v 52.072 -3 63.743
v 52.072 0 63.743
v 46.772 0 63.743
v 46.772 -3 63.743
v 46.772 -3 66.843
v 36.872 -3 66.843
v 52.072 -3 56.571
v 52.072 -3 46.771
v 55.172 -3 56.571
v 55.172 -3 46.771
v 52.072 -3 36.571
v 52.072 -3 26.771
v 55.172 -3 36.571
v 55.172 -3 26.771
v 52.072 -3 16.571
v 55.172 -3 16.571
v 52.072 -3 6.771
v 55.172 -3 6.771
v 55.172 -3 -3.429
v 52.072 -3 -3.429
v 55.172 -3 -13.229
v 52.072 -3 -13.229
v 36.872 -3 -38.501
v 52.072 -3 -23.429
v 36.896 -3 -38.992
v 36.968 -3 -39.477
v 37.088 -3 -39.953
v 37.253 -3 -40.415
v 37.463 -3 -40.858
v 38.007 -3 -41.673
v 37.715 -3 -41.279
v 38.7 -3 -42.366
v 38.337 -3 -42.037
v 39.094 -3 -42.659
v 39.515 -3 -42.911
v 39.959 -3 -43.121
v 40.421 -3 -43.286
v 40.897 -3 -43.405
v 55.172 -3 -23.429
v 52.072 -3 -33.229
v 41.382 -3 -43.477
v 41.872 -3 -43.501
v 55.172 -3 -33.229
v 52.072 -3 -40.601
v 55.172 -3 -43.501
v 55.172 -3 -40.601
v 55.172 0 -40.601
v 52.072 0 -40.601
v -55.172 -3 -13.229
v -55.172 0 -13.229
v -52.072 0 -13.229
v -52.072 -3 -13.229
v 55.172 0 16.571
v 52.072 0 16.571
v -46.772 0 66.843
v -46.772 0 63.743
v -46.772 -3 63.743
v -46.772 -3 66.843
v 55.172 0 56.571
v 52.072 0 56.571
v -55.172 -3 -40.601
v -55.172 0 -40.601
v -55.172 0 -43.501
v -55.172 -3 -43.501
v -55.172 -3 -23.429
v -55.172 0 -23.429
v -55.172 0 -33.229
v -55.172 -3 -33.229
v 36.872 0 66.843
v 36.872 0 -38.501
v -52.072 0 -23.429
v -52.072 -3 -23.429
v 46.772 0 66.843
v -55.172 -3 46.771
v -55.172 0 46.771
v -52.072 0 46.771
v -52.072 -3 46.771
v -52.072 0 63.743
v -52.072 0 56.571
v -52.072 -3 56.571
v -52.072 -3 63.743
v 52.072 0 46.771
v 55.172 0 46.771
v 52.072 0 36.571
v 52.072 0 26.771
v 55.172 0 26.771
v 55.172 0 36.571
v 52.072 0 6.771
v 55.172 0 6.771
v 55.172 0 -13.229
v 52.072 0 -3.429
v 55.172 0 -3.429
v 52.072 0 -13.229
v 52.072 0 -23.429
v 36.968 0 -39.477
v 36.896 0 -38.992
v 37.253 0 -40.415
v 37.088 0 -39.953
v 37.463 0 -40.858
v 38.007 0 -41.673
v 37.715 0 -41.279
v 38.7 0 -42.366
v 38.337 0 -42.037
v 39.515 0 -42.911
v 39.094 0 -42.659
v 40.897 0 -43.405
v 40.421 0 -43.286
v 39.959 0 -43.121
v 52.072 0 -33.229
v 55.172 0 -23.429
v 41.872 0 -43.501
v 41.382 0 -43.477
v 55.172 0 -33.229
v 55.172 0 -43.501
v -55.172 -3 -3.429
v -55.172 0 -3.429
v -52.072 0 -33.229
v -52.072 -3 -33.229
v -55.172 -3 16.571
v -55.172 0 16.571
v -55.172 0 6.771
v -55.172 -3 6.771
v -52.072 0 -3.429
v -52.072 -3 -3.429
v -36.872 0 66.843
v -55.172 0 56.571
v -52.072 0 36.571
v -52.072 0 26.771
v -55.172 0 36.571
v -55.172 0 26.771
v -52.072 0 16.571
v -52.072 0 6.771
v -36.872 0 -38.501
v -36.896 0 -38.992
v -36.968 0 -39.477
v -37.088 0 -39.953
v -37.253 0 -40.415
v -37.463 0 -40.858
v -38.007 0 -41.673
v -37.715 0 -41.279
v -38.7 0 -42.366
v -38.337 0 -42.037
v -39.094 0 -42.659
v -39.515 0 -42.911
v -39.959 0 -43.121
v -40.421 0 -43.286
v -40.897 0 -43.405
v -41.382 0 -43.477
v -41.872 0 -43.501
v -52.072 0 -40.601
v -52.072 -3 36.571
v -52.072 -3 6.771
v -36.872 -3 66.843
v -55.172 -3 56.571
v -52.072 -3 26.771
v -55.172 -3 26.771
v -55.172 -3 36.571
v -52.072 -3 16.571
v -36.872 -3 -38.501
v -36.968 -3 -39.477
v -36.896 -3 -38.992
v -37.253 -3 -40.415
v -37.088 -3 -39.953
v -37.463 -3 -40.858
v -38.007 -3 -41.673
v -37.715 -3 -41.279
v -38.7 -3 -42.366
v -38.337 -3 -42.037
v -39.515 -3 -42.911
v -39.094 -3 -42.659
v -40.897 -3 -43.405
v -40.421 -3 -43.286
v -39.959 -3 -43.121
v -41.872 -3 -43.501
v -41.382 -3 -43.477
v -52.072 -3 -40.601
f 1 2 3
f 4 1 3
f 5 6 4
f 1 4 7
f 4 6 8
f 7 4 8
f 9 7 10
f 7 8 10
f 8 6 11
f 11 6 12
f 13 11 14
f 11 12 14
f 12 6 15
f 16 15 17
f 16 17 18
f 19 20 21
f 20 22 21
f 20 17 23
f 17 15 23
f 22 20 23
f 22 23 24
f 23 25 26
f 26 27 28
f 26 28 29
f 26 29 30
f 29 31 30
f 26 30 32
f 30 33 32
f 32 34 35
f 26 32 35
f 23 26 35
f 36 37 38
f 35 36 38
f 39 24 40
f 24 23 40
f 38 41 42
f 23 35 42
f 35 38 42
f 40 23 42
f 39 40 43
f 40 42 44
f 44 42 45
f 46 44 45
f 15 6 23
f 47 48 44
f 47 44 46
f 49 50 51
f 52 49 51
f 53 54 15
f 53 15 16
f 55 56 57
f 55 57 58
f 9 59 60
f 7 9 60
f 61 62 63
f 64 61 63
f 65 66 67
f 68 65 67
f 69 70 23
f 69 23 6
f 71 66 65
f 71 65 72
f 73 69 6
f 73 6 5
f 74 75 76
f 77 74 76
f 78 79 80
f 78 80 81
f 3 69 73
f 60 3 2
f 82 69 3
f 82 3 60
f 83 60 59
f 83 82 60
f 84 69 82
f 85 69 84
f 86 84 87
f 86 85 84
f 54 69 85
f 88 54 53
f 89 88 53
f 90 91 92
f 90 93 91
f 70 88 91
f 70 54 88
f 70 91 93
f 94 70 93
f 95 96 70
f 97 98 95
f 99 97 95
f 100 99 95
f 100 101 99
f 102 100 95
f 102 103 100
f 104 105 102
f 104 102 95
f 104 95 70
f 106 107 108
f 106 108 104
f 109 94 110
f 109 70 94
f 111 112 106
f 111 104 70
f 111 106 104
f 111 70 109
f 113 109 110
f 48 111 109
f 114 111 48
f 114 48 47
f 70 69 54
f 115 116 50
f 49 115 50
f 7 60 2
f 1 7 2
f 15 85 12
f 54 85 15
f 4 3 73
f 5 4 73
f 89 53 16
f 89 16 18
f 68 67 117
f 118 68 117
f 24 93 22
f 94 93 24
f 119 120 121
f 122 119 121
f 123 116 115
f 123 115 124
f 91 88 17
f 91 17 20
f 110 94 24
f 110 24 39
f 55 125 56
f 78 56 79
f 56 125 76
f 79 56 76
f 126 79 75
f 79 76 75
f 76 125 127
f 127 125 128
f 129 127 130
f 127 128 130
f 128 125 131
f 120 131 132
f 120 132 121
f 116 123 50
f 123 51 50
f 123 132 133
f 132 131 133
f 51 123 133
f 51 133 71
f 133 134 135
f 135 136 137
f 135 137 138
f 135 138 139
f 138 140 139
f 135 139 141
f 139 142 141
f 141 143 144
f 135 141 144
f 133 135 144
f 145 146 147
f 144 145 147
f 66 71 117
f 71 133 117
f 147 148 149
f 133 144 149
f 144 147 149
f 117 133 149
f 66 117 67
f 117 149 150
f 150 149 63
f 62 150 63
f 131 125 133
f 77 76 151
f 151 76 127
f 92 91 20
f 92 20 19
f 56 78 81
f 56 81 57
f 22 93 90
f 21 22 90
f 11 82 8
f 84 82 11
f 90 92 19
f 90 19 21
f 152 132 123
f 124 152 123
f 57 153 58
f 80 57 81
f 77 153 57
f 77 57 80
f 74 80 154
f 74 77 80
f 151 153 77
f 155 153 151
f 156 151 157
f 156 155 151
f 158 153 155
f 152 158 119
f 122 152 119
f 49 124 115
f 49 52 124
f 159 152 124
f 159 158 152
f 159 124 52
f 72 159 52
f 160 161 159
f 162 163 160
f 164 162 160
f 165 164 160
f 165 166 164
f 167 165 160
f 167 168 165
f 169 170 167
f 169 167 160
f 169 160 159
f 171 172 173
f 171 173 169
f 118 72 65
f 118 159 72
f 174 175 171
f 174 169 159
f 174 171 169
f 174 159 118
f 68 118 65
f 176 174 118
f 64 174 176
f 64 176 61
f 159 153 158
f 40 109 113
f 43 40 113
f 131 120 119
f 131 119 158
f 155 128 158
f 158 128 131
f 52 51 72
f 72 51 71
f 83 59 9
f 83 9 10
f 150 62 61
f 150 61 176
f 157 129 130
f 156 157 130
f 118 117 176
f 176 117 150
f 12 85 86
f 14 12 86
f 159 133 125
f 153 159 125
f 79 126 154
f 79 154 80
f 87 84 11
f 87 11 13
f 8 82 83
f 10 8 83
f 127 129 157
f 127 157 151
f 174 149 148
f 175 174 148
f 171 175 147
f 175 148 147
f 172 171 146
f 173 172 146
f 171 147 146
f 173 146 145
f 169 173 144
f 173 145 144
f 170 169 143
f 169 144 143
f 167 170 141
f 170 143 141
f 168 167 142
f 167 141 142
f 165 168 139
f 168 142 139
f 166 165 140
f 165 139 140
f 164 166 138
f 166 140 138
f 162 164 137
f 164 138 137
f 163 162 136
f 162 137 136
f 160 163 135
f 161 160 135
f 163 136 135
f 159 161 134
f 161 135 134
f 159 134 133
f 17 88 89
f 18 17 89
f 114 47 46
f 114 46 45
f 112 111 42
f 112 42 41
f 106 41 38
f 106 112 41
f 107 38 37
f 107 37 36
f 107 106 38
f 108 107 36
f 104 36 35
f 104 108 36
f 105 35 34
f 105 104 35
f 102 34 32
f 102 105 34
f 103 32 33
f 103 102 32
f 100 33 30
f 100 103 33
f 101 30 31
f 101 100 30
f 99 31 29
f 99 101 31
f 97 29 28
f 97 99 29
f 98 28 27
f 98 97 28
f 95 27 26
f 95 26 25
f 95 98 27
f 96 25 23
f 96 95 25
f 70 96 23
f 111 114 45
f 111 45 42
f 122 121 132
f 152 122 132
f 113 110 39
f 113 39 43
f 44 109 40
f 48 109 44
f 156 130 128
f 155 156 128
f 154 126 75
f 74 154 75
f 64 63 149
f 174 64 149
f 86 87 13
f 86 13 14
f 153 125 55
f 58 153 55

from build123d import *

# Parameters (mm, degrees)
BOSS_EXTRUDE1_DEPTH   = 3
BOSS_EXTRUDE1_2_DEPTH = 3
SKETCH2_W             = 3.2
SKETCH2_H             = 10.2
SKETCH2_H_2           = 7.372217102
CUT_EXTRUDE1_DEPTH    = 4


with BuildPart() as part:
    # Sketch1 → Boss-Extrude1 (new body)
    with BuildSketch(Plane(origin=(0, 0, 0), x_dir=(1, 0, 0), z_dir=(0, 1, 0))):
        with BuildLine():
            Line((-36.872217102, 38.501443346), (-36.872217102, -66.842990858))
            Line((-36.872217102, -66.842990858), (-55.172217102, -66.842990858))
            Line((-55.172217102, -66.842990858), (-55.172217102, 43.501443346))
            Line((-55.172217102, 43.501443346), (-41.872217102, 43.501443346))
            ThreePointArc((-41.872217102, 43.501443346), (-38.336683196, 42.036977252), (-36.872217102, 38.501443346))
        make_face()
    extrude(amount=-BOSS_EXTRUDE1_DEPTH)


with BuildPart() as body_2:
    # Sketch1 → Boss-Extrude1 2 (new body)
    with BuildSketch(Plane(origin=(0, 0, 0), x_dir=(1, 0, 0), z_dir=(0, 1, 0))):
        with BuildLine():
            Line((36.872217102, 38.501443346), (36.872217102, -66.842990858))
            Line((36.872217102, -66.842990858), (55.172217102, -66.842990858))
            Line((55.172217102, -66.842990858), (55.172217102, 43.501443346))
            Line((55.172217102, 43.501443346), (41.872217102, 43.501443346))
            ThreePointArc((41.872217102, 43.501443346), (38.336683196, 42.036977252), (36.872217102, 38.501443346))
        make_face()
    extrude(amount=-BOSS_EXTRUDE1_2_DEPTH)


with BuildPart() as cut_extrude1_tool:
    # Sketch2 → Cut-Extrude1 (new body, through all)
    with BuildSketch(Plane(origin=(0, 0, 0), x_dir=(1, 0, 0), z_dir=(0, 1, 0))):
        with Locations((53.672217102, -1.670773756)):
            Rectangle(SKETCH2_W, SKETCH2_H)
        with Locations((53.672217102, 18.329226244)):
            Rectangle(SKETCH2_W, SKETCH2_H)
        with Locations((53.672217102, -21.670773756)):
            Rectangle(SKETCH2_W, SKETCH2_H)
        with Locations((-53.672217102, 18.329226244)):
            Rectangle(SKETCH2_W, SKETCH2_H)
        with Locations((-53.672217102, -1.670773756)):
            Rectangle(SKETCH2_W, SKETCH2_H)
        with Locations((53.672217102, 36.915334795)):
            Rectangle(SKETCH2_W, SKETCH2_H_2)
        with Locations((-53.672217102, -21.670773756)):
            Rectangle(SKETCH2_W, SKETCH2_H)
        with Locations((53.672217102, -41.670773756)):
            Rectangle(SKETCH2_W, SKETCH2_H)
        Polygon((46.772217102, -66.942990858), (55.272217102, -66.942990858), (55.272217102, -56.570773756), (52.072217102, -56.570773756), (52.072217102, -63.742990858), (46.772217102, -63.742990858), align=None)
        with Locations((-53.672217102, 36.915334795)):
            Rectangle(SKETCH2_W, SKETCH2_H_2)
        with Locations((-53.672217102, -41.670773756)):
            Rectangle(SKETCH2_W, SKETCH2_H)
        Polygon((-46.772217102, -66.942990858), (-55.272217102, -66.942990858), (-55.272217102, -56.570773756), (-52.072217102, -56.570773756), (-52.072217102, -63.742990858), (-46.772217102, -63.742990858), align=None)
    extrude(amount=-CUT_EXTRUDE1_DEPTH)


with BuildPart() as part_1:
    add(part.part)

    # Cut-Extrude1: cut by cut_extrude1_tool
    add(cut_extrude1_tool.part, mode=Mode.SUBTRACT)


with BuildPart() as body_2_1:
    add(body_2.part)

    # Cut-Extrude1: cut by cut_extrude1_tool
    add(cut_extrude1_tool.part, mode=Mode.SUBTRACT)


solid = Compound([part_1.part, body_2_1.part])
